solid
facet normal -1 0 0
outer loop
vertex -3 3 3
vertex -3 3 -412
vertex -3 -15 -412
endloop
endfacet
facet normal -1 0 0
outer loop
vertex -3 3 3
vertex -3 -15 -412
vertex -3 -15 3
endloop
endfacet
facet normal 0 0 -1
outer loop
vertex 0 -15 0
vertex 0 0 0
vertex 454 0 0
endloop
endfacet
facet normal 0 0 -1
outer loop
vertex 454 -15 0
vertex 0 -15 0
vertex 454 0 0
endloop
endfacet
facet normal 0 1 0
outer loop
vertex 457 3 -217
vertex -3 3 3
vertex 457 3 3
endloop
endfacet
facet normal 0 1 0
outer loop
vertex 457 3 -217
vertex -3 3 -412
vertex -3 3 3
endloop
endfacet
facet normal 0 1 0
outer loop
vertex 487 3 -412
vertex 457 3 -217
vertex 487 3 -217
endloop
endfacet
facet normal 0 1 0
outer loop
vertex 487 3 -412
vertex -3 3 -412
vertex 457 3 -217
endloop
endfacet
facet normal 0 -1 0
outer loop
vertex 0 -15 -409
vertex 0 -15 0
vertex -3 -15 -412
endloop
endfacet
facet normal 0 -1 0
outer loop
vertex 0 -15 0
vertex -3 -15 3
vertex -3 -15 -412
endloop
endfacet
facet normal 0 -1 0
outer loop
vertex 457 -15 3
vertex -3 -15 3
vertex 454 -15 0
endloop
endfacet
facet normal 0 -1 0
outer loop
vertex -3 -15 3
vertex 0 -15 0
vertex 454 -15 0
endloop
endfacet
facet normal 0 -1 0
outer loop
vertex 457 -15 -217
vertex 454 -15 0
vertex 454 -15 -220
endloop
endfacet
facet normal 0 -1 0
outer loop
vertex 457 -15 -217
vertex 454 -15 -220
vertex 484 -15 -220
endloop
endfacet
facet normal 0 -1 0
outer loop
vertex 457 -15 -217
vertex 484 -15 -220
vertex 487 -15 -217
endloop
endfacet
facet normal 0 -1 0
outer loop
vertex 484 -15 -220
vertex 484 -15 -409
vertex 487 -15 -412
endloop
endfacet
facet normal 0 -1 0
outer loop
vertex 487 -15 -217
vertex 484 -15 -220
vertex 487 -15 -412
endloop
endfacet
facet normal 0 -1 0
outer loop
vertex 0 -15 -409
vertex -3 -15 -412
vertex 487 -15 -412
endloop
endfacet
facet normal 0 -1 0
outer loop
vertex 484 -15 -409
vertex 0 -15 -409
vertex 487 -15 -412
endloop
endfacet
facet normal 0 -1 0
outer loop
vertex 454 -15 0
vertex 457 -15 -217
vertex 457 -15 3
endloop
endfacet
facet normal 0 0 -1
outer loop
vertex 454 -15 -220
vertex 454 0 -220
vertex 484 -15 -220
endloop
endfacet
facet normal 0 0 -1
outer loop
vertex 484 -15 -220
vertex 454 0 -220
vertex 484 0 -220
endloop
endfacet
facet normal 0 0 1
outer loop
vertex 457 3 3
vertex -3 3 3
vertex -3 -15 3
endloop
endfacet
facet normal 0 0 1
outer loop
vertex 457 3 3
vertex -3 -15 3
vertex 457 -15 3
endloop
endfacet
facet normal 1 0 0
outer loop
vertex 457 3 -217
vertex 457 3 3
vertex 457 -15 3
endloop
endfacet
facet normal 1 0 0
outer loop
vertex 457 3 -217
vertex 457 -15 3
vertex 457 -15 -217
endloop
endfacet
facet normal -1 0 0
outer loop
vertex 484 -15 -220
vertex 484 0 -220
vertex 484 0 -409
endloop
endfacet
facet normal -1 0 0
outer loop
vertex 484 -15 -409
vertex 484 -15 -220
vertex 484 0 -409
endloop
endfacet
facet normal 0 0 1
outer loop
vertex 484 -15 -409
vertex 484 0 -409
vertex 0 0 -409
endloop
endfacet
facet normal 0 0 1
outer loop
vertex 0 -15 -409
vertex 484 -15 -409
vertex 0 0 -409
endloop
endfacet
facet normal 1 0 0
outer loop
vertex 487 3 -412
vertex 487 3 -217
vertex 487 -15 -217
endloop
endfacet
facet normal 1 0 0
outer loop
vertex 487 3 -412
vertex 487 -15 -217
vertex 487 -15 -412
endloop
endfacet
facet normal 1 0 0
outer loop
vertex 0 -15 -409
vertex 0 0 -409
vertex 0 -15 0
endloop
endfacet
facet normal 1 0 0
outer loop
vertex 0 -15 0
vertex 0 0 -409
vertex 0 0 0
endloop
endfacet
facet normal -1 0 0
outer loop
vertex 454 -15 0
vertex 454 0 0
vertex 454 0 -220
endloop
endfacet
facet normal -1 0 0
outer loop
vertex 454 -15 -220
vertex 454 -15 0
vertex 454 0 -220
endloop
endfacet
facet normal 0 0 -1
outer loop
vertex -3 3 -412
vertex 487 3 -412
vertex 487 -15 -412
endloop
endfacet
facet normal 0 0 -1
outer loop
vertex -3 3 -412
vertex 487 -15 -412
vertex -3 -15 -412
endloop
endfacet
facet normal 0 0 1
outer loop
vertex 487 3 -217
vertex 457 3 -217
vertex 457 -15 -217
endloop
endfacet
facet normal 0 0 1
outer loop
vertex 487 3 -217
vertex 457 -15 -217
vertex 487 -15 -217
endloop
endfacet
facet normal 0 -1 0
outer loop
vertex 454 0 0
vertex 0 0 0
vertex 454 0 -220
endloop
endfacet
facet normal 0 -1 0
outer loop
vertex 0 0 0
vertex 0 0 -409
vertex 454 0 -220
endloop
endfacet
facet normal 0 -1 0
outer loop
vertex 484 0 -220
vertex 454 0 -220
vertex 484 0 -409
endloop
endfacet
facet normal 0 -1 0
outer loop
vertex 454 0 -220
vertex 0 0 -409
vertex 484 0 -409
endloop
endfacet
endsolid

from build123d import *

# Parameters (mm, degrees)
DODANIE_WYCI_GNI_CIE1_DEPTH = 15
SKORUPA1_T                  = 3


with BuildPart() as part:
    # Szkic1 → Dodanie-wyciągnięcie1 (new body)
    with BuildSketch(Plane(origin=(0, 0, 0), x_dir=(1, 0, 0), z_dir=(0, 1, 0))):
        Polygon((0, 0), (454, 0), (454, 220), (484, 220), (484, 409), (0, 409), align=None)
    extrude(amount=-DODANIE_WYCI_GNI_CIE1_DEPTH)

    # Skorupa1
    skorupa1_openings = [part.faces().sort_by_distance(p)[0] for p in [
        (234.170613934, -15, -207.75936997),
    ]]
    offset(amount=SKORUPA1_T, openings=skorupa1_openings, kind=Kind.INTERSECTION)


solid = part.part
